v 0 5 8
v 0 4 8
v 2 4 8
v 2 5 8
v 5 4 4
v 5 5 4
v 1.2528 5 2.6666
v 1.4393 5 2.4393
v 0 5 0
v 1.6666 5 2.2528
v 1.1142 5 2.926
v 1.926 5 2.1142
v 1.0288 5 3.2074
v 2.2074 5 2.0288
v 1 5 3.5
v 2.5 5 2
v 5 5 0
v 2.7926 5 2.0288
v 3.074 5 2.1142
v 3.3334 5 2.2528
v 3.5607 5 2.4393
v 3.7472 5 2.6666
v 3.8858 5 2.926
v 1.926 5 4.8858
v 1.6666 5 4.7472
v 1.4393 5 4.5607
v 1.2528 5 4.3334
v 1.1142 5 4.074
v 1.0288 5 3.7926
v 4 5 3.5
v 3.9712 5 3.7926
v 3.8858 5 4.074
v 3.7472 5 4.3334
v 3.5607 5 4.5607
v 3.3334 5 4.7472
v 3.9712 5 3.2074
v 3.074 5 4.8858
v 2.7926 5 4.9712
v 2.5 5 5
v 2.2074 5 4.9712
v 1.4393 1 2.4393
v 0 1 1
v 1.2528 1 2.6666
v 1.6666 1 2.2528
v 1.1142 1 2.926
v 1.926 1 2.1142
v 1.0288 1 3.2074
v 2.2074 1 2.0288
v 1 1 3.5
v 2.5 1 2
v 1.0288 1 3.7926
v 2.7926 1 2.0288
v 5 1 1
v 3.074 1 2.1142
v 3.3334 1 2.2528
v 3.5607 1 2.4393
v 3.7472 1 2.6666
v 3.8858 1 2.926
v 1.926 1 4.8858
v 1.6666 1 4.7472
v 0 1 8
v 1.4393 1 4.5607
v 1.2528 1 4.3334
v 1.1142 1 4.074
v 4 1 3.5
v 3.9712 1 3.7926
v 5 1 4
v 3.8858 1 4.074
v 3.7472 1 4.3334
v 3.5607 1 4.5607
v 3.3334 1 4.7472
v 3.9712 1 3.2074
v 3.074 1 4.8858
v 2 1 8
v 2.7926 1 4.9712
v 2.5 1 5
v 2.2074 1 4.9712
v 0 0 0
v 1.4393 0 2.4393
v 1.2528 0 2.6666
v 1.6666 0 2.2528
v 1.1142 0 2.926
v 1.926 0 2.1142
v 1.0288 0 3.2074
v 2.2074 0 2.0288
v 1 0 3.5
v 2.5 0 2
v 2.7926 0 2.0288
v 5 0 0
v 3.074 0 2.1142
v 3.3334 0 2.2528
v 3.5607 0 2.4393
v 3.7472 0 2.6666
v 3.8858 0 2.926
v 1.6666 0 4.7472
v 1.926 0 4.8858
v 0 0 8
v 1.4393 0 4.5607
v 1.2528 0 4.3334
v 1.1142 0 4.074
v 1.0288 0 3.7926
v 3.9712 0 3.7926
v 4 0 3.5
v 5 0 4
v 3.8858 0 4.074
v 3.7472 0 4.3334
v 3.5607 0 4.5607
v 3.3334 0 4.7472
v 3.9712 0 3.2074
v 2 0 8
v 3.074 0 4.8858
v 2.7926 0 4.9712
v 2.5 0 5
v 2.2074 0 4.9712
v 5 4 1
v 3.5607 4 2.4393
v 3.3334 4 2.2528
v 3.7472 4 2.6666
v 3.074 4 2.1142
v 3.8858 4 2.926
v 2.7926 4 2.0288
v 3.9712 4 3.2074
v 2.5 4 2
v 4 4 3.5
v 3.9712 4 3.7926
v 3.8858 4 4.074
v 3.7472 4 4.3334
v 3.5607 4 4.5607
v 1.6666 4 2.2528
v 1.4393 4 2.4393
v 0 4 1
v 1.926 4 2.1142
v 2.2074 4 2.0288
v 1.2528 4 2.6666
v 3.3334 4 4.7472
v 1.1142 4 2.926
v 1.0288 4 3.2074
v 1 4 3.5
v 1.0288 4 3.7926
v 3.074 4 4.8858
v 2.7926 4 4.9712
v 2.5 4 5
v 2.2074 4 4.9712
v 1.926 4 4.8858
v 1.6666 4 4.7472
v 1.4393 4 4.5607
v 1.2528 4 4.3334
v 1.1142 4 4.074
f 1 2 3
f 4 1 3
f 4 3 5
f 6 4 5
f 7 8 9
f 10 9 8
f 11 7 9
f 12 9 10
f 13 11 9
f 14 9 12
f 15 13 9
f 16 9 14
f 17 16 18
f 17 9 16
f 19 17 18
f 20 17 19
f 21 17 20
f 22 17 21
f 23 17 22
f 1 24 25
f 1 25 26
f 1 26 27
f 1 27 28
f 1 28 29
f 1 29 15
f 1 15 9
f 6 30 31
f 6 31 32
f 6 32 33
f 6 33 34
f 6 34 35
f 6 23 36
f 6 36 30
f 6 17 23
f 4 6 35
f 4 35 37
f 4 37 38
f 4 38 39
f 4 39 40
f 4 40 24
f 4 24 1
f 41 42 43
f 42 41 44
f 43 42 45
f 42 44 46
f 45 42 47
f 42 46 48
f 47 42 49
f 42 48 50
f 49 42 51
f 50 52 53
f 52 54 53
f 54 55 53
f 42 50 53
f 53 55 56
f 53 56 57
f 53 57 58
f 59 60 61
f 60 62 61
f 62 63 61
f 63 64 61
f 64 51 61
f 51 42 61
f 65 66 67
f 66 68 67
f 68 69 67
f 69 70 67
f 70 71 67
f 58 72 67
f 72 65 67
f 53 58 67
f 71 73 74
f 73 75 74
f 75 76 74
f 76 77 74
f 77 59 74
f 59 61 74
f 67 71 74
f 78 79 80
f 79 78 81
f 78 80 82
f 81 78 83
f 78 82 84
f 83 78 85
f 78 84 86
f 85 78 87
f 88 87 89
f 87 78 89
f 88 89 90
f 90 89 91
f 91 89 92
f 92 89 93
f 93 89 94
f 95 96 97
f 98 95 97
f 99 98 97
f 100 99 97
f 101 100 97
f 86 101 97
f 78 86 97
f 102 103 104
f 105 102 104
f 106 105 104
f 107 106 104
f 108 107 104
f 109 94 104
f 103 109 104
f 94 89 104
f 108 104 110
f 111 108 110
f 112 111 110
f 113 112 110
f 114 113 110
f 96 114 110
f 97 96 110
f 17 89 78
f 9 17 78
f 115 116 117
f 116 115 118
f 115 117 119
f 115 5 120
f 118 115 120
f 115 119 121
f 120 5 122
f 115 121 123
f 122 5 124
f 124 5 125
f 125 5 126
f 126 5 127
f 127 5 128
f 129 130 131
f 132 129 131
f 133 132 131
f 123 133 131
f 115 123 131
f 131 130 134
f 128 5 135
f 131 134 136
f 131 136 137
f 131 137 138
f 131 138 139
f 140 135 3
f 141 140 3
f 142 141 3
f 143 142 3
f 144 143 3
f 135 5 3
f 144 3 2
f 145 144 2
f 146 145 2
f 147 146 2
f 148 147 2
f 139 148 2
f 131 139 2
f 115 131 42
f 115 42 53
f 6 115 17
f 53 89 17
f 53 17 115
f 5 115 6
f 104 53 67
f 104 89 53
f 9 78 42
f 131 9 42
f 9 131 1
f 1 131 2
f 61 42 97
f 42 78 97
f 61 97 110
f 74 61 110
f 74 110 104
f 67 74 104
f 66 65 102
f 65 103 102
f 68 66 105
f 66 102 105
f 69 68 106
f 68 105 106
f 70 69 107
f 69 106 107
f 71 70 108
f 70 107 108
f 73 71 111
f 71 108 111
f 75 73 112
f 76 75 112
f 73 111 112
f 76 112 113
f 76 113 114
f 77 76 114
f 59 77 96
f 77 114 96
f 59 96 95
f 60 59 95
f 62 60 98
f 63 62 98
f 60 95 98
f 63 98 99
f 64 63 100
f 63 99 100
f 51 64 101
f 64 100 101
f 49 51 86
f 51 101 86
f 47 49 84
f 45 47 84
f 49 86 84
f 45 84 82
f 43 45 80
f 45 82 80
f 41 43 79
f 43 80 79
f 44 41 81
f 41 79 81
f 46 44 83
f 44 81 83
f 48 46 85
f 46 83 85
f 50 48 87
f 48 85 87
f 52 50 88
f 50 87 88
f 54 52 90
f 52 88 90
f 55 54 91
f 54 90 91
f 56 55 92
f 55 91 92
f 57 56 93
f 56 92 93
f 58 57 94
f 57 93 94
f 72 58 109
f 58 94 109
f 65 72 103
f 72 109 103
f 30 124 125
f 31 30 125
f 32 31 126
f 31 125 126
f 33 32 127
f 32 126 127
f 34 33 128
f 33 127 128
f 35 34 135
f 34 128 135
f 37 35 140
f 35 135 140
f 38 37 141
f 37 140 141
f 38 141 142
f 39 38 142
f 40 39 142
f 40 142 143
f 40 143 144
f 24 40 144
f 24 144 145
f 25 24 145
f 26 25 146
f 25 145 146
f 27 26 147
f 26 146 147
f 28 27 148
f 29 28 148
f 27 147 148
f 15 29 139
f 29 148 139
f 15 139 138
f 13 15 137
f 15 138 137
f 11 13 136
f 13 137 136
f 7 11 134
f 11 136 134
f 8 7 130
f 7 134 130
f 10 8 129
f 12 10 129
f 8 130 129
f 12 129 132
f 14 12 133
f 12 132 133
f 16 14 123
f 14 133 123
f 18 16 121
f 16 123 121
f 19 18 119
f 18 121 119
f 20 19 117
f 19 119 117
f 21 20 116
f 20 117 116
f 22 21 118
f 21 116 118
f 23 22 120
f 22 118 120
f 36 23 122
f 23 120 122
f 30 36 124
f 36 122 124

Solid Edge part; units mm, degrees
sketch "Sketch1" plane through (0, 0, 0) normal (0, -1, 0) x (1, 0, 0)
  circle A0 centre (2.5, 3.5) radius 1.5
  line L0 (2, 8) -> (5, 4)
  line L1 (5, 0) -> (5, 4)
  line L2 (5, 0) -> (0, 0)
  line L3 (0, 0) -> (0, 8)
  line L4 (0, 8) -> (2, 8)
extrude "Protrusion1" add sketch "Sketch1" against normal blind 5
sketch "Sketch2" plane through (1, 2.5, 8) normal (0, 0, 1) x (1, 0, 0)
  line L0 (-1, 1.5) -> (-1, -1.5)
  line L1 (-1, -1.5) -> (4, -1.5)
  line L2 (4, -1.5) -> (4, 1.5)
  line L3 (4, 1.5) -> (-1, 1.5)
extrude "ExtrudedCutout_1" cut sketch "Sketch2" against normal blind 7 and the other way blind 1
